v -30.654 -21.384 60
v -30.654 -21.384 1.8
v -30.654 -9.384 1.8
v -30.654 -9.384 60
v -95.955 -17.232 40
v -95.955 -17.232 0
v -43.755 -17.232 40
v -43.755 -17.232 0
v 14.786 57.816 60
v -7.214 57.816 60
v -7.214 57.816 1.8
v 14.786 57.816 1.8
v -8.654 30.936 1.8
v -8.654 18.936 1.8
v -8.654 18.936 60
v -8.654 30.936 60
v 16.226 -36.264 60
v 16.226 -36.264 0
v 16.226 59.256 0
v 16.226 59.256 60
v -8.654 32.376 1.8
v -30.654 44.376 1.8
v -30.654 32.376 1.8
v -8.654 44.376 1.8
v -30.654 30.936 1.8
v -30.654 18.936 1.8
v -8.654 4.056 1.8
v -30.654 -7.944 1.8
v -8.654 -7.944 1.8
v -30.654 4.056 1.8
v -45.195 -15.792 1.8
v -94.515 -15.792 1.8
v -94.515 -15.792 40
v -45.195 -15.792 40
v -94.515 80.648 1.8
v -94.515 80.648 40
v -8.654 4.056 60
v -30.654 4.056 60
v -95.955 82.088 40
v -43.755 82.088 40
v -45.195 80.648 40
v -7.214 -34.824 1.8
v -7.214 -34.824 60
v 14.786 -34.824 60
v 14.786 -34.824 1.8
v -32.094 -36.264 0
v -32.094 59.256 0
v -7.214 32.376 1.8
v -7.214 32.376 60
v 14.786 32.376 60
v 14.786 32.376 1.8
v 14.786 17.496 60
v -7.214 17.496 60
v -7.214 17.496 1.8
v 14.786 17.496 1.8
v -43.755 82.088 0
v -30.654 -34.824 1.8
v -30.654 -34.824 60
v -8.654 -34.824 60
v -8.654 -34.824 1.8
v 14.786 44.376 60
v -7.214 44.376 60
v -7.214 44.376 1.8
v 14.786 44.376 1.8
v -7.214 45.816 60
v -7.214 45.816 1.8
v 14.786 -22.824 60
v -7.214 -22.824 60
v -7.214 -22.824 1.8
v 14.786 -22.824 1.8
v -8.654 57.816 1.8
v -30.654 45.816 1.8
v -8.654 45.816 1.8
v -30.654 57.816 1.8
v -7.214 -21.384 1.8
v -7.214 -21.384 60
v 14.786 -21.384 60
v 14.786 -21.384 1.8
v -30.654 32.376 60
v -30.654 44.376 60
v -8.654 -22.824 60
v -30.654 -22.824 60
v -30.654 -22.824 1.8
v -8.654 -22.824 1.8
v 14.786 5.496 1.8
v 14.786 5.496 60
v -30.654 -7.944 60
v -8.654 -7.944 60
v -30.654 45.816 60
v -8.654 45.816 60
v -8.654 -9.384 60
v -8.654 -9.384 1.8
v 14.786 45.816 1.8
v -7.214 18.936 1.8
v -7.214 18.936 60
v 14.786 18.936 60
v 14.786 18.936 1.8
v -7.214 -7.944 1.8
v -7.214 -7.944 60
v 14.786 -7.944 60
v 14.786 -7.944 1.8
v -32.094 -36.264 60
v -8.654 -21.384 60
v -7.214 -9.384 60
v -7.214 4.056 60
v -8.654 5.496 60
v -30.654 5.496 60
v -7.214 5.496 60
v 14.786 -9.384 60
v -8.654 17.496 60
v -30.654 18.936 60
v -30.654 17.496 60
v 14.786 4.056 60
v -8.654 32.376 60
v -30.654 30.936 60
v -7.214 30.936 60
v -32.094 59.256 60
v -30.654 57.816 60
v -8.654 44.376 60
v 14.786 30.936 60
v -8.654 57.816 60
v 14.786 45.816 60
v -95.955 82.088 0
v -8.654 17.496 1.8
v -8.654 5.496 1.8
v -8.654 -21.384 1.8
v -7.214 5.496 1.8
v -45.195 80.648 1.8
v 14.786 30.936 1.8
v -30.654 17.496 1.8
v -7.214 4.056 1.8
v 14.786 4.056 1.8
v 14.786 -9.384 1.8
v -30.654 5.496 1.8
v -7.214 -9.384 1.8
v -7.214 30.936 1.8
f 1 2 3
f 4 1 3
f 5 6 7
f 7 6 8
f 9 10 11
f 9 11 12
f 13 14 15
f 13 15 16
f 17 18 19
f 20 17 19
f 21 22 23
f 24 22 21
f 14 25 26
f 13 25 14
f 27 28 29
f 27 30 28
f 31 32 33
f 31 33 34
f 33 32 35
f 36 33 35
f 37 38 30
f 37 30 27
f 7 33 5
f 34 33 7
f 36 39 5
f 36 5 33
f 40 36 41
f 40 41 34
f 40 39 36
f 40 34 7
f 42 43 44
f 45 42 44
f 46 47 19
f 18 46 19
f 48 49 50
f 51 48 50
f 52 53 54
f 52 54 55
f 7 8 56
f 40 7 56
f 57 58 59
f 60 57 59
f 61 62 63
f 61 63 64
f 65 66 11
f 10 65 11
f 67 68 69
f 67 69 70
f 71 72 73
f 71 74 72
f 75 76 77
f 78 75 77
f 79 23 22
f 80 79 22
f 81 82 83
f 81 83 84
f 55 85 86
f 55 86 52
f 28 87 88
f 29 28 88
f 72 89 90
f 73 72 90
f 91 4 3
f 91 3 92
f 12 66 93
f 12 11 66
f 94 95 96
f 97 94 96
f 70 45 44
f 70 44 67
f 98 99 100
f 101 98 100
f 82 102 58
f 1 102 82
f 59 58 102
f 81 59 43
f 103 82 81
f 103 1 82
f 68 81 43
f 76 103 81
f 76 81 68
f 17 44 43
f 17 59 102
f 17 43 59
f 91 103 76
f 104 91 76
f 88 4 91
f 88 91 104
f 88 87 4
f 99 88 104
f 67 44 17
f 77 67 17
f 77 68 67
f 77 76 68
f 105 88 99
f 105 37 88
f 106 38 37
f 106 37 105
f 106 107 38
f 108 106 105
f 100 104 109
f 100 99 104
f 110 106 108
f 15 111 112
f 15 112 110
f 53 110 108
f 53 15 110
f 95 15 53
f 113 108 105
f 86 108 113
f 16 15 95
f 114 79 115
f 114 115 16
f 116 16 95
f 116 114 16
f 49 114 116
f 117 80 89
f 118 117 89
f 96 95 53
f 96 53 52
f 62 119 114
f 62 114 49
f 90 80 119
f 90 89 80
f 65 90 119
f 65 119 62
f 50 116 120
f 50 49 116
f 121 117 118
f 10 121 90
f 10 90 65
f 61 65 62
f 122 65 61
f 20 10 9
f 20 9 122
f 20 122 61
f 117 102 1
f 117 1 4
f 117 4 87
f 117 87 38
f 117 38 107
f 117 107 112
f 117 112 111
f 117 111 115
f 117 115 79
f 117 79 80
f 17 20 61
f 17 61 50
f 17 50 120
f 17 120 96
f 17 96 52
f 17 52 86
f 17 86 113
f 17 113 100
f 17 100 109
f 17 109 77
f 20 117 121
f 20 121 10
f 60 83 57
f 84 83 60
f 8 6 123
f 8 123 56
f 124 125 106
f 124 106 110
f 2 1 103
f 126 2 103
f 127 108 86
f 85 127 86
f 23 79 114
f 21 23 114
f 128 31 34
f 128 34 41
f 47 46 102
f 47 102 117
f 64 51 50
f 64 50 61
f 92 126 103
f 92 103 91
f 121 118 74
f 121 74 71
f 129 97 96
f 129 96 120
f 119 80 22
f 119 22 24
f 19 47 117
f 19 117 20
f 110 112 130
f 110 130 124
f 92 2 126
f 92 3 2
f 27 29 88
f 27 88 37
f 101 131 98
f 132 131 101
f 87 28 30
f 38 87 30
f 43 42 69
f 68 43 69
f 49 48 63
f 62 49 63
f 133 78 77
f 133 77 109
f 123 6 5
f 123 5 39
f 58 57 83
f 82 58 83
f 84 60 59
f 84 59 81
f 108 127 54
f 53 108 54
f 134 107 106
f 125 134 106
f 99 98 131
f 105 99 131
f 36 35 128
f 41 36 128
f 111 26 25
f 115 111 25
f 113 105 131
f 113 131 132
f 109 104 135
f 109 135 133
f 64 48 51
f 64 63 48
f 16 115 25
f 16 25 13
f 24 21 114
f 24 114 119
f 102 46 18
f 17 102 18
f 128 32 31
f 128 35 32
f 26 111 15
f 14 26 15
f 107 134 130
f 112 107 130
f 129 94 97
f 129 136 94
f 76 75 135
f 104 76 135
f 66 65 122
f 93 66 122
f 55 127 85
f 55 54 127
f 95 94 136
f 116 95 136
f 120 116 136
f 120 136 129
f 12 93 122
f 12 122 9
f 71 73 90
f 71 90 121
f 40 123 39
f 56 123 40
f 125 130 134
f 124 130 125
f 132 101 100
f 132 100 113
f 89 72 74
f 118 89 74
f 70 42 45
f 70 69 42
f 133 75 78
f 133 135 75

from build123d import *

# Parameters (mm, degrees)
F0_W     = 48.32
F0_H     = 95.52
F0_W_2   = 22
F0_H_2   = 12
F1_DEPTH = 1.8
F2_DEPTH = 60
F3_W     = 52.2
F3_H     = 99.32
F3_W_2   = 49.32
F3_H_2   = 96.44
F4_DEPTH = 1.8
F5_DEPTH = 40


with BuildPart() as f1:
    # F0 (on Top) → F1 (new body)
    with BuildSketch(Plane.XY):
        with Locations((-7.9342950767, 11.4956763754)):
            Rectangle(F0_W, F0_H)
        with Locations((-19.6542950767, -28.8243236246)):
            Rectangle(F0_W_2, F0_H_2, mode=Mode.SUBTRACT)
        with Locations((-19.6542950767, -15.3843236246)):
            Rectangle(F0_W_2, F0_H_2, mode=Mode.SUBTRACT)
        with Locations((-19.6542950767, -1.9443236246)):
            Rectangle(F0_W_2, F0_H_2, mode=Mode.SUBTRACT)
        with Locations((-19.6542950767, 11.4956763754)):
            Rectangle(F0_W_2, F0_H_2, mode=Mode.SUBTRACT)
        with Locations((3.7857049233, -28.8243236246)):
            Rectangle(F0_W_2, F0_H_2, mode=Mode.SUBTRACT)
        with Locations((3.7857049233, -15.3843236246)):
            Rectangle(F0_W_2, F0_H_2, mode=Mode.SUBTRACT)
        with Locations((3.7857049233, -1.9443236246)):
            Rectangle(F0_W_2, F0_H_2, mode=Mode.SUBTRACT)
        with Locations((-19.6542950767, 24.9356763754)):
            Rectangle(F0_W_2, F0_H_2, mode=Mode.SUBTRACT)
        with Locations((-19.6542950767, 38.3756763754)):
            Rectangle(F0_W_2, F0_H_2, mode=Mode.SUBTRACT)
        with Locations((-19.6542950767, 51.8156763754)):
            Rectangle(F0_W_2, F0_H_2, mode=Mode.SUBTRACT)
        with Locations((3.7857049233, 11.4956763754)):
            Rectangle(F0_W_2, F0_H_2, mode=Mode.SUBTRACT)
        with Locations((3.7857049233, 24.9356763754)):
            Rectangle(F0_W_2, F0_H_2, mode=Mode.SUBTRACT)
        with Locations((3.7857049233, 38.3756763754)):
            Rectangle(F0_W_2, F0_H_2, mode=Mode.SUBTRACT)
        with Locations((3.7857049233, 51.8156763754)):
            Rectangle(F0_W_2, F0_H_2, mode=Mode.SUBTRACT)
        with Locations((-19.6542950767, 51.8156763754)):
            Rectangle(F0_W_2, F0_H_2)
        with Locations((-19.6542950767, 24.9356763754)):
            Rectangle(F0_W_2, F0_H_2)
        with Locations((3.7857049233, -1.9443236246)):
            Rectangle(F0_W_2, F0_H_2)
        with Locations((3.7857049233, -15.3843236246)):
            Rectangle(F0_W_2, F0_H_2)
        with Locations((3.7857049233, 11.4956763754)):
            Rectangle(F0_W_2, F0_H_2)
        with Locations((-19.6542950767, -15.3843236246)):
            Rectangle(F0_W_2, F0_H_2)
        with Locations((3.7857049233, 38.3756763754)):
            Rectangle(F0_W_2, F0_H_2)
        with Locations((-19.6542950767, -1.9443236246)):
            Rectangle(F0_W_2, F0_H_2)
        with Locations((-19.6542950767, 11.4956763754)):
            Rectangle(F0_W_2, F0_H_2)
        with Locations((3.7857049233, -28.8243236246)):
            Rectangle(F0_W_2, F0_H_2)
        with Locations((-19.6542950767, -28.8243236246)):
            Rectangle(F0_W_2, F0_H_2)
        with Locations((3.7857049233, 51.8156763754)):
            Rectangle(F0_W_2, F0_H_2)
        with Locations((-19.6542950767, 38.3756763754)):
            Rectangle(F0_W_2, F0_H_2)
        with Locations((3.7857049233, 24.9356763754)):
            Rectangle(F0_W_2, F0_H_2)
    extrude(amount=F1_DEPTH)

    # F0 (on Top) → F2 (join)
    with BuildSketch(Plane.XY):
        with Locations((-7.9342950767, 11.4956763754)):
            Rectangle(F0_W, F0_H)
        with Locations((-19.6542950767, -28.8243236246)):
            Rectangle(F0_W_2, F0_H_2, mode=Mode.SUBTRACT)
        with Locations((-19.6542950767, -15.3843236246)):
            Rectangle(F0_W_2, F0_H_2, mode=Mode.SUBTRACT)
        with Locations((-19.6542950767, -1.9443236246)):
            Rectangle(F0_W_2, F0_H_2, mode=Mode.SUBTRACT)
        with Locations((-19.6542950767, 11.4956763754)):
            Rectangle(F0_W_2, F0_H_2, mode=Mode.SUBTRACT)
        with Locations((3.7857049233, -28.8243236246)):
            Rectangle(F0_W_2, F0_H_2, mode=Mode.SUBTRACT)
        with Locations((3.7857049233, -15.3843236246)):
            Rectangle(F0_W_2, F0_H_2, mode=Mode.SUBTRACT)
        with Locations((3.7857049233, -1.9443236246)):
            Rectangle(F0_W_2, F0_H_2, mode=Mode.SUBTRACT)
        with Locations((-19.6542950767, 24.9356763754)):
            Rectangle(F0_W_2, F0_H_2, mode=Mode.SUBTRACT)
        with Locations((-19.6542950767, 38.3756763754)):
            Rectangle(F0_W_2, F0_H_2, mode=Mode.SUBTRACT)
        with Locations((-19.6542950767, 51.8156763754)):
            Rectangle(F0_W_2, F0_H_2, mode=Mode.SUBTRACT)
        with Locations((3.7857049233, 11.4956763754)):
            Rectangle(F0_W_2, F0_H_2, mode=Mode.SUBTRACT)
        with Locations((3.7857049233, 24.9356763754)):
            Rectangle(F0_W_2, F0_H_2, mode=Mode.SUBTRACT)
        with Locations((3.7857049233, 38.3756763754)):
            Rectangle(F0_W_2, F0_H_2, mode=Mode.SUBTRACT)
        with Locations((3.7857049233, 51.8156763754)):
            Rectangle(F0_W_2, F0_H_2, mode=Mode.SUBTRACT)
    extrude(amount=F2_DEPTH)


with BuildPart() as f4:
    # F3 (on Top) → F4 (new body)
    with BuildSketch(Plane.XY):
        with Locations((-69.8553323746, 32.4284926394)):
            Rectangle(F3_W, F3_H)
        with Locations((-69.8553323746, 32.4284926394)):
            Rectangle(F3_W_2, F3_H_2, mode=Mode.SUBTRACT)
        with Locations((-69.8553323746, 32.4284926394)):
            Rectangle(F3_W_2, F3_H_2)
    extrude(amount=F4_DEPTH)

    # F3 (on Top) → F5 (join)
    with BuildSketch(Plane.XY):
        with Locations((-69.8553323746, 32.4284926394)):
            Rectangle(F3_W, F3_H)
        with Locations((-69.8553323746, 32.4284926394)):
            Rectangle(F3_W_2, F3_H_2, mode=Mode.SUBTRACT)
    extrude(amount=F5_DEPTH)


solid = Compound([f1.part, f4.part])
